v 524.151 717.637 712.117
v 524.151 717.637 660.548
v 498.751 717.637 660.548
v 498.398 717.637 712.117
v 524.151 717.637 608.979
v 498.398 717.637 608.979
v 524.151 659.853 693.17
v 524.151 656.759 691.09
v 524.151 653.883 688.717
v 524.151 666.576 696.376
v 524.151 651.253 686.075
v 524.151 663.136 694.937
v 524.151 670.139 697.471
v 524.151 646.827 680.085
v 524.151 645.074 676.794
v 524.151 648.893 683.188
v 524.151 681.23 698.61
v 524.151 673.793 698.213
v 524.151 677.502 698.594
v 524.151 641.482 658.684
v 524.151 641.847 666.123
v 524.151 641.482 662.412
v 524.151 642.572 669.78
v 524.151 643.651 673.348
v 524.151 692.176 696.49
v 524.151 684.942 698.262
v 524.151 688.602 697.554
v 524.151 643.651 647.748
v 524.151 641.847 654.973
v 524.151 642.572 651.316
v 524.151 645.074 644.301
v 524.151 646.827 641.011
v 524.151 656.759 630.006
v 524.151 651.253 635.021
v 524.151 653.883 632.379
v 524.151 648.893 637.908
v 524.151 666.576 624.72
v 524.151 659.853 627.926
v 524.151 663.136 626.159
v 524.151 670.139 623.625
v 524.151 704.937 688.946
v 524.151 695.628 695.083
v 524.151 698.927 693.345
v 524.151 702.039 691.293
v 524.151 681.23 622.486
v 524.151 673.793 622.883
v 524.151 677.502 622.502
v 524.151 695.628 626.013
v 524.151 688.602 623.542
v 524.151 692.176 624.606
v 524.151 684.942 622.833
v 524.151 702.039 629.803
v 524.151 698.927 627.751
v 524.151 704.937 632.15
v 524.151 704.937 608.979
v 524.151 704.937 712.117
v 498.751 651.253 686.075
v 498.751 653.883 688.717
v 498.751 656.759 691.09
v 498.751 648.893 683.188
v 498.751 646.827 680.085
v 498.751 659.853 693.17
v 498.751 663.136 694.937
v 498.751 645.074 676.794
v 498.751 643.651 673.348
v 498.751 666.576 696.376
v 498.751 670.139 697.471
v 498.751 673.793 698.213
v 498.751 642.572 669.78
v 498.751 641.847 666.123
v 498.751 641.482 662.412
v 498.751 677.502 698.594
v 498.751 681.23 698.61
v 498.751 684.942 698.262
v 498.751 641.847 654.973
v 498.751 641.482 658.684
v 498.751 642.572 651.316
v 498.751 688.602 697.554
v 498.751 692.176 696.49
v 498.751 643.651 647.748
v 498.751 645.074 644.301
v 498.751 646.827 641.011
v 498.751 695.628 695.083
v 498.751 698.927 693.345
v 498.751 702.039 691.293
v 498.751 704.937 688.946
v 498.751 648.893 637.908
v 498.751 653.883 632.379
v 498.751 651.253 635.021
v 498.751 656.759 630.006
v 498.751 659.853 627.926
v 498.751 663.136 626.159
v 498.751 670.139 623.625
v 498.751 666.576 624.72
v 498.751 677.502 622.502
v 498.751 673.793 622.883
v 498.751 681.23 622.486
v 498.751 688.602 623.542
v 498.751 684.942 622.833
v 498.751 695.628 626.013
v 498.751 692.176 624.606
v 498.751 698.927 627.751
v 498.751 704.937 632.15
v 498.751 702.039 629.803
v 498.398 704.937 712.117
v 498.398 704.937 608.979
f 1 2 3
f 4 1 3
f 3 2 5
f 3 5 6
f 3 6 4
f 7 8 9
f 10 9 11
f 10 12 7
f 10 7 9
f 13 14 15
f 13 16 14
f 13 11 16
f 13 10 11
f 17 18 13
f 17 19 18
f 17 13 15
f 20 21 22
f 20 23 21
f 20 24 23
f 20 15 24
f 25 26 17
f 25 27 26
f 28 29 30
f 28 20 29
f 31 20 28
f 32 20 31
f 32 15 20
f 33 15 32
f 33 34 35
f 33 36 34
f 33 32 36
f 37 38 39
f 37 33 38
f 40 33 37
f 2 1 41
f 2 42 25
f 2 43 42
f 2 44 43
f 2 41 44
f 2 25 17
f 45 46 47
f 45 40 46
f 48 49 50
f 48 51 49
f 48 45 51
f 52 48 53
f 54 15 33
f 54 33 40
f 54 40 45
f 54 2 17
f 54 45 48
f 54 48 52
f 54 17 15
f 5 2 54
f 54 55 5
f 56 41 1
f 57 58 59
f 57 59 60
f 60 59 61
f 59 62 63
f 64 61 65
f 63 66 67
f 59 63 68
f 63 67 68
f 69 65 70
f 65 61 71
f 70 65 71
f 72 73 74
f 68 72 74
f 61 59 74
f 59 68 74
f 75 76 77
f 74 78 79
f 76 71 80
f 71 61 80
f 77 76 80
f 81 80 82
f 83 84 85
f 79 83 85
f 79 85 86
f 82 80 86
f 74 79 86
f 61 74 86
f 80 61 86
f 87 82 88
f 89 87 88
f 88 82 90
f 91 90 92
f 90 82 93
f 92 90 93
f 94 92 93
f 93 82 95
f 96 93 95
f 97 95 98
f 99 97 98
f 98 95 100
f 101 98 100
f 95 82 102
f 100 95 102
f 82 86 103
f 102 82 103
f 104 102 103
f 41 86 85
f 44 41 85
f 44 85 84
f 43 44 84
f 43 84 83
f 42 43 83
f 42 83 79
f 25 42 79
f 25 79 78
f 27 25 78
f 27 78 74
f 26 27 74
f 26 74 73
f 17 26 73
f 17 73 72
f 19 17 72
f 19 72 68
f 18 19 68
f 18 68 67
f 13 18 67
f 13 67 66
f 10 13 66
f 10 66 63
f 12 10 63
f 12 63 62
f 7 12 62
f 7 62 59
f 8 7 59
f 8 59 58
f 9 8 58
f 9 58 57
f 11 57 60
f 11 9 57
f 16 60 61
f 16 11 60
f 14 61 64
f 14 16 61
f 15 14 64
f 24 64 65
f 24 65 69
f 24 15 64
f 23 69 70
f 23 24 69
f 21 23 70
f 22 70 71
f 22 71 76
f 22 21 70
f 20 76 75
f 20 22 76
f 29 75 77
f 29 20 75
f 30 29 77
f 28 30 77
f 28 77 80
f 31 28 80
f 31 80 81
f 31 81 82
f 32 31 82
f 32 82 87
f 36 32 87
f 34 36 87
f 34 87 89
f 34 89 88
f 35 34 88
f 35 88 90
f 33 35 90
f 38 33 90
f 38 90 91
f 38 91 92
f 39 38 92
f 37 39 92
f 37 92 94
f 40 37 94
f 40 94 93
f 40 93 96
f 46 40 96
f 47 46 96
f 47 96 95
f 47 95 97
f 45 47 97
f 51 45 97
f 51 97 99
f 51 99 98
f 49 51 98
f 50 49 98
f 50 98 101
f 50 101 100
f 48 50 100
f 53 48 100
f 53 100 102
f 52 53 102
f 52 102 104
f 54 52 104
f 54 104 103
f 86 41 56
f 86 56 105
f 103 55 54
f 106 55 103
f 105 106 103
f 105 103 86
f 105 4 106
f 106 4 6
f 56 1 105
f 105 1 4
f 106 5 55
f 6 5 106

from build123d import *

# Parameters (mm, degrees)
SKETCH3_W           = 25.753050404
SKETCH3_H           = 103.137359271
BOSS_EXTRUDE1_DEPTH = 12.7
SKETCH4_R           = 38.1
BOSS_EXTRUDE2_DEPTH = 25.4


with BuildPart() as part:
    # Sketch3 → Boss-Extrude1 (new body)
    with BuildSketch(Plane(origin=(0, 717.636591226, 0), x_dir=(-1, 0, 0), z_dir=(0, -1, 0))):
        with Locations((-511.2749233, -660.547915429)):
            Rectangle(SKETCH3_W, SKETCH3_H)
    extrude(amount=BOSS_EXTRUDE1_DEPTH)

    # Sketch4 → Boss-Extrude2 (add)
    with BuildSketch(Plane(origin=(524.151448502, 0, 0), x_dir=(0, 0, -1), z_dir=(1, 0, 0))):
        with Locations((-660.547915428, 679.536591226)):
            Circle(SKETCH4_R)
    extrude(amount=-BOSS_EXTRUDE2_DEPTH)


solid = part.part
